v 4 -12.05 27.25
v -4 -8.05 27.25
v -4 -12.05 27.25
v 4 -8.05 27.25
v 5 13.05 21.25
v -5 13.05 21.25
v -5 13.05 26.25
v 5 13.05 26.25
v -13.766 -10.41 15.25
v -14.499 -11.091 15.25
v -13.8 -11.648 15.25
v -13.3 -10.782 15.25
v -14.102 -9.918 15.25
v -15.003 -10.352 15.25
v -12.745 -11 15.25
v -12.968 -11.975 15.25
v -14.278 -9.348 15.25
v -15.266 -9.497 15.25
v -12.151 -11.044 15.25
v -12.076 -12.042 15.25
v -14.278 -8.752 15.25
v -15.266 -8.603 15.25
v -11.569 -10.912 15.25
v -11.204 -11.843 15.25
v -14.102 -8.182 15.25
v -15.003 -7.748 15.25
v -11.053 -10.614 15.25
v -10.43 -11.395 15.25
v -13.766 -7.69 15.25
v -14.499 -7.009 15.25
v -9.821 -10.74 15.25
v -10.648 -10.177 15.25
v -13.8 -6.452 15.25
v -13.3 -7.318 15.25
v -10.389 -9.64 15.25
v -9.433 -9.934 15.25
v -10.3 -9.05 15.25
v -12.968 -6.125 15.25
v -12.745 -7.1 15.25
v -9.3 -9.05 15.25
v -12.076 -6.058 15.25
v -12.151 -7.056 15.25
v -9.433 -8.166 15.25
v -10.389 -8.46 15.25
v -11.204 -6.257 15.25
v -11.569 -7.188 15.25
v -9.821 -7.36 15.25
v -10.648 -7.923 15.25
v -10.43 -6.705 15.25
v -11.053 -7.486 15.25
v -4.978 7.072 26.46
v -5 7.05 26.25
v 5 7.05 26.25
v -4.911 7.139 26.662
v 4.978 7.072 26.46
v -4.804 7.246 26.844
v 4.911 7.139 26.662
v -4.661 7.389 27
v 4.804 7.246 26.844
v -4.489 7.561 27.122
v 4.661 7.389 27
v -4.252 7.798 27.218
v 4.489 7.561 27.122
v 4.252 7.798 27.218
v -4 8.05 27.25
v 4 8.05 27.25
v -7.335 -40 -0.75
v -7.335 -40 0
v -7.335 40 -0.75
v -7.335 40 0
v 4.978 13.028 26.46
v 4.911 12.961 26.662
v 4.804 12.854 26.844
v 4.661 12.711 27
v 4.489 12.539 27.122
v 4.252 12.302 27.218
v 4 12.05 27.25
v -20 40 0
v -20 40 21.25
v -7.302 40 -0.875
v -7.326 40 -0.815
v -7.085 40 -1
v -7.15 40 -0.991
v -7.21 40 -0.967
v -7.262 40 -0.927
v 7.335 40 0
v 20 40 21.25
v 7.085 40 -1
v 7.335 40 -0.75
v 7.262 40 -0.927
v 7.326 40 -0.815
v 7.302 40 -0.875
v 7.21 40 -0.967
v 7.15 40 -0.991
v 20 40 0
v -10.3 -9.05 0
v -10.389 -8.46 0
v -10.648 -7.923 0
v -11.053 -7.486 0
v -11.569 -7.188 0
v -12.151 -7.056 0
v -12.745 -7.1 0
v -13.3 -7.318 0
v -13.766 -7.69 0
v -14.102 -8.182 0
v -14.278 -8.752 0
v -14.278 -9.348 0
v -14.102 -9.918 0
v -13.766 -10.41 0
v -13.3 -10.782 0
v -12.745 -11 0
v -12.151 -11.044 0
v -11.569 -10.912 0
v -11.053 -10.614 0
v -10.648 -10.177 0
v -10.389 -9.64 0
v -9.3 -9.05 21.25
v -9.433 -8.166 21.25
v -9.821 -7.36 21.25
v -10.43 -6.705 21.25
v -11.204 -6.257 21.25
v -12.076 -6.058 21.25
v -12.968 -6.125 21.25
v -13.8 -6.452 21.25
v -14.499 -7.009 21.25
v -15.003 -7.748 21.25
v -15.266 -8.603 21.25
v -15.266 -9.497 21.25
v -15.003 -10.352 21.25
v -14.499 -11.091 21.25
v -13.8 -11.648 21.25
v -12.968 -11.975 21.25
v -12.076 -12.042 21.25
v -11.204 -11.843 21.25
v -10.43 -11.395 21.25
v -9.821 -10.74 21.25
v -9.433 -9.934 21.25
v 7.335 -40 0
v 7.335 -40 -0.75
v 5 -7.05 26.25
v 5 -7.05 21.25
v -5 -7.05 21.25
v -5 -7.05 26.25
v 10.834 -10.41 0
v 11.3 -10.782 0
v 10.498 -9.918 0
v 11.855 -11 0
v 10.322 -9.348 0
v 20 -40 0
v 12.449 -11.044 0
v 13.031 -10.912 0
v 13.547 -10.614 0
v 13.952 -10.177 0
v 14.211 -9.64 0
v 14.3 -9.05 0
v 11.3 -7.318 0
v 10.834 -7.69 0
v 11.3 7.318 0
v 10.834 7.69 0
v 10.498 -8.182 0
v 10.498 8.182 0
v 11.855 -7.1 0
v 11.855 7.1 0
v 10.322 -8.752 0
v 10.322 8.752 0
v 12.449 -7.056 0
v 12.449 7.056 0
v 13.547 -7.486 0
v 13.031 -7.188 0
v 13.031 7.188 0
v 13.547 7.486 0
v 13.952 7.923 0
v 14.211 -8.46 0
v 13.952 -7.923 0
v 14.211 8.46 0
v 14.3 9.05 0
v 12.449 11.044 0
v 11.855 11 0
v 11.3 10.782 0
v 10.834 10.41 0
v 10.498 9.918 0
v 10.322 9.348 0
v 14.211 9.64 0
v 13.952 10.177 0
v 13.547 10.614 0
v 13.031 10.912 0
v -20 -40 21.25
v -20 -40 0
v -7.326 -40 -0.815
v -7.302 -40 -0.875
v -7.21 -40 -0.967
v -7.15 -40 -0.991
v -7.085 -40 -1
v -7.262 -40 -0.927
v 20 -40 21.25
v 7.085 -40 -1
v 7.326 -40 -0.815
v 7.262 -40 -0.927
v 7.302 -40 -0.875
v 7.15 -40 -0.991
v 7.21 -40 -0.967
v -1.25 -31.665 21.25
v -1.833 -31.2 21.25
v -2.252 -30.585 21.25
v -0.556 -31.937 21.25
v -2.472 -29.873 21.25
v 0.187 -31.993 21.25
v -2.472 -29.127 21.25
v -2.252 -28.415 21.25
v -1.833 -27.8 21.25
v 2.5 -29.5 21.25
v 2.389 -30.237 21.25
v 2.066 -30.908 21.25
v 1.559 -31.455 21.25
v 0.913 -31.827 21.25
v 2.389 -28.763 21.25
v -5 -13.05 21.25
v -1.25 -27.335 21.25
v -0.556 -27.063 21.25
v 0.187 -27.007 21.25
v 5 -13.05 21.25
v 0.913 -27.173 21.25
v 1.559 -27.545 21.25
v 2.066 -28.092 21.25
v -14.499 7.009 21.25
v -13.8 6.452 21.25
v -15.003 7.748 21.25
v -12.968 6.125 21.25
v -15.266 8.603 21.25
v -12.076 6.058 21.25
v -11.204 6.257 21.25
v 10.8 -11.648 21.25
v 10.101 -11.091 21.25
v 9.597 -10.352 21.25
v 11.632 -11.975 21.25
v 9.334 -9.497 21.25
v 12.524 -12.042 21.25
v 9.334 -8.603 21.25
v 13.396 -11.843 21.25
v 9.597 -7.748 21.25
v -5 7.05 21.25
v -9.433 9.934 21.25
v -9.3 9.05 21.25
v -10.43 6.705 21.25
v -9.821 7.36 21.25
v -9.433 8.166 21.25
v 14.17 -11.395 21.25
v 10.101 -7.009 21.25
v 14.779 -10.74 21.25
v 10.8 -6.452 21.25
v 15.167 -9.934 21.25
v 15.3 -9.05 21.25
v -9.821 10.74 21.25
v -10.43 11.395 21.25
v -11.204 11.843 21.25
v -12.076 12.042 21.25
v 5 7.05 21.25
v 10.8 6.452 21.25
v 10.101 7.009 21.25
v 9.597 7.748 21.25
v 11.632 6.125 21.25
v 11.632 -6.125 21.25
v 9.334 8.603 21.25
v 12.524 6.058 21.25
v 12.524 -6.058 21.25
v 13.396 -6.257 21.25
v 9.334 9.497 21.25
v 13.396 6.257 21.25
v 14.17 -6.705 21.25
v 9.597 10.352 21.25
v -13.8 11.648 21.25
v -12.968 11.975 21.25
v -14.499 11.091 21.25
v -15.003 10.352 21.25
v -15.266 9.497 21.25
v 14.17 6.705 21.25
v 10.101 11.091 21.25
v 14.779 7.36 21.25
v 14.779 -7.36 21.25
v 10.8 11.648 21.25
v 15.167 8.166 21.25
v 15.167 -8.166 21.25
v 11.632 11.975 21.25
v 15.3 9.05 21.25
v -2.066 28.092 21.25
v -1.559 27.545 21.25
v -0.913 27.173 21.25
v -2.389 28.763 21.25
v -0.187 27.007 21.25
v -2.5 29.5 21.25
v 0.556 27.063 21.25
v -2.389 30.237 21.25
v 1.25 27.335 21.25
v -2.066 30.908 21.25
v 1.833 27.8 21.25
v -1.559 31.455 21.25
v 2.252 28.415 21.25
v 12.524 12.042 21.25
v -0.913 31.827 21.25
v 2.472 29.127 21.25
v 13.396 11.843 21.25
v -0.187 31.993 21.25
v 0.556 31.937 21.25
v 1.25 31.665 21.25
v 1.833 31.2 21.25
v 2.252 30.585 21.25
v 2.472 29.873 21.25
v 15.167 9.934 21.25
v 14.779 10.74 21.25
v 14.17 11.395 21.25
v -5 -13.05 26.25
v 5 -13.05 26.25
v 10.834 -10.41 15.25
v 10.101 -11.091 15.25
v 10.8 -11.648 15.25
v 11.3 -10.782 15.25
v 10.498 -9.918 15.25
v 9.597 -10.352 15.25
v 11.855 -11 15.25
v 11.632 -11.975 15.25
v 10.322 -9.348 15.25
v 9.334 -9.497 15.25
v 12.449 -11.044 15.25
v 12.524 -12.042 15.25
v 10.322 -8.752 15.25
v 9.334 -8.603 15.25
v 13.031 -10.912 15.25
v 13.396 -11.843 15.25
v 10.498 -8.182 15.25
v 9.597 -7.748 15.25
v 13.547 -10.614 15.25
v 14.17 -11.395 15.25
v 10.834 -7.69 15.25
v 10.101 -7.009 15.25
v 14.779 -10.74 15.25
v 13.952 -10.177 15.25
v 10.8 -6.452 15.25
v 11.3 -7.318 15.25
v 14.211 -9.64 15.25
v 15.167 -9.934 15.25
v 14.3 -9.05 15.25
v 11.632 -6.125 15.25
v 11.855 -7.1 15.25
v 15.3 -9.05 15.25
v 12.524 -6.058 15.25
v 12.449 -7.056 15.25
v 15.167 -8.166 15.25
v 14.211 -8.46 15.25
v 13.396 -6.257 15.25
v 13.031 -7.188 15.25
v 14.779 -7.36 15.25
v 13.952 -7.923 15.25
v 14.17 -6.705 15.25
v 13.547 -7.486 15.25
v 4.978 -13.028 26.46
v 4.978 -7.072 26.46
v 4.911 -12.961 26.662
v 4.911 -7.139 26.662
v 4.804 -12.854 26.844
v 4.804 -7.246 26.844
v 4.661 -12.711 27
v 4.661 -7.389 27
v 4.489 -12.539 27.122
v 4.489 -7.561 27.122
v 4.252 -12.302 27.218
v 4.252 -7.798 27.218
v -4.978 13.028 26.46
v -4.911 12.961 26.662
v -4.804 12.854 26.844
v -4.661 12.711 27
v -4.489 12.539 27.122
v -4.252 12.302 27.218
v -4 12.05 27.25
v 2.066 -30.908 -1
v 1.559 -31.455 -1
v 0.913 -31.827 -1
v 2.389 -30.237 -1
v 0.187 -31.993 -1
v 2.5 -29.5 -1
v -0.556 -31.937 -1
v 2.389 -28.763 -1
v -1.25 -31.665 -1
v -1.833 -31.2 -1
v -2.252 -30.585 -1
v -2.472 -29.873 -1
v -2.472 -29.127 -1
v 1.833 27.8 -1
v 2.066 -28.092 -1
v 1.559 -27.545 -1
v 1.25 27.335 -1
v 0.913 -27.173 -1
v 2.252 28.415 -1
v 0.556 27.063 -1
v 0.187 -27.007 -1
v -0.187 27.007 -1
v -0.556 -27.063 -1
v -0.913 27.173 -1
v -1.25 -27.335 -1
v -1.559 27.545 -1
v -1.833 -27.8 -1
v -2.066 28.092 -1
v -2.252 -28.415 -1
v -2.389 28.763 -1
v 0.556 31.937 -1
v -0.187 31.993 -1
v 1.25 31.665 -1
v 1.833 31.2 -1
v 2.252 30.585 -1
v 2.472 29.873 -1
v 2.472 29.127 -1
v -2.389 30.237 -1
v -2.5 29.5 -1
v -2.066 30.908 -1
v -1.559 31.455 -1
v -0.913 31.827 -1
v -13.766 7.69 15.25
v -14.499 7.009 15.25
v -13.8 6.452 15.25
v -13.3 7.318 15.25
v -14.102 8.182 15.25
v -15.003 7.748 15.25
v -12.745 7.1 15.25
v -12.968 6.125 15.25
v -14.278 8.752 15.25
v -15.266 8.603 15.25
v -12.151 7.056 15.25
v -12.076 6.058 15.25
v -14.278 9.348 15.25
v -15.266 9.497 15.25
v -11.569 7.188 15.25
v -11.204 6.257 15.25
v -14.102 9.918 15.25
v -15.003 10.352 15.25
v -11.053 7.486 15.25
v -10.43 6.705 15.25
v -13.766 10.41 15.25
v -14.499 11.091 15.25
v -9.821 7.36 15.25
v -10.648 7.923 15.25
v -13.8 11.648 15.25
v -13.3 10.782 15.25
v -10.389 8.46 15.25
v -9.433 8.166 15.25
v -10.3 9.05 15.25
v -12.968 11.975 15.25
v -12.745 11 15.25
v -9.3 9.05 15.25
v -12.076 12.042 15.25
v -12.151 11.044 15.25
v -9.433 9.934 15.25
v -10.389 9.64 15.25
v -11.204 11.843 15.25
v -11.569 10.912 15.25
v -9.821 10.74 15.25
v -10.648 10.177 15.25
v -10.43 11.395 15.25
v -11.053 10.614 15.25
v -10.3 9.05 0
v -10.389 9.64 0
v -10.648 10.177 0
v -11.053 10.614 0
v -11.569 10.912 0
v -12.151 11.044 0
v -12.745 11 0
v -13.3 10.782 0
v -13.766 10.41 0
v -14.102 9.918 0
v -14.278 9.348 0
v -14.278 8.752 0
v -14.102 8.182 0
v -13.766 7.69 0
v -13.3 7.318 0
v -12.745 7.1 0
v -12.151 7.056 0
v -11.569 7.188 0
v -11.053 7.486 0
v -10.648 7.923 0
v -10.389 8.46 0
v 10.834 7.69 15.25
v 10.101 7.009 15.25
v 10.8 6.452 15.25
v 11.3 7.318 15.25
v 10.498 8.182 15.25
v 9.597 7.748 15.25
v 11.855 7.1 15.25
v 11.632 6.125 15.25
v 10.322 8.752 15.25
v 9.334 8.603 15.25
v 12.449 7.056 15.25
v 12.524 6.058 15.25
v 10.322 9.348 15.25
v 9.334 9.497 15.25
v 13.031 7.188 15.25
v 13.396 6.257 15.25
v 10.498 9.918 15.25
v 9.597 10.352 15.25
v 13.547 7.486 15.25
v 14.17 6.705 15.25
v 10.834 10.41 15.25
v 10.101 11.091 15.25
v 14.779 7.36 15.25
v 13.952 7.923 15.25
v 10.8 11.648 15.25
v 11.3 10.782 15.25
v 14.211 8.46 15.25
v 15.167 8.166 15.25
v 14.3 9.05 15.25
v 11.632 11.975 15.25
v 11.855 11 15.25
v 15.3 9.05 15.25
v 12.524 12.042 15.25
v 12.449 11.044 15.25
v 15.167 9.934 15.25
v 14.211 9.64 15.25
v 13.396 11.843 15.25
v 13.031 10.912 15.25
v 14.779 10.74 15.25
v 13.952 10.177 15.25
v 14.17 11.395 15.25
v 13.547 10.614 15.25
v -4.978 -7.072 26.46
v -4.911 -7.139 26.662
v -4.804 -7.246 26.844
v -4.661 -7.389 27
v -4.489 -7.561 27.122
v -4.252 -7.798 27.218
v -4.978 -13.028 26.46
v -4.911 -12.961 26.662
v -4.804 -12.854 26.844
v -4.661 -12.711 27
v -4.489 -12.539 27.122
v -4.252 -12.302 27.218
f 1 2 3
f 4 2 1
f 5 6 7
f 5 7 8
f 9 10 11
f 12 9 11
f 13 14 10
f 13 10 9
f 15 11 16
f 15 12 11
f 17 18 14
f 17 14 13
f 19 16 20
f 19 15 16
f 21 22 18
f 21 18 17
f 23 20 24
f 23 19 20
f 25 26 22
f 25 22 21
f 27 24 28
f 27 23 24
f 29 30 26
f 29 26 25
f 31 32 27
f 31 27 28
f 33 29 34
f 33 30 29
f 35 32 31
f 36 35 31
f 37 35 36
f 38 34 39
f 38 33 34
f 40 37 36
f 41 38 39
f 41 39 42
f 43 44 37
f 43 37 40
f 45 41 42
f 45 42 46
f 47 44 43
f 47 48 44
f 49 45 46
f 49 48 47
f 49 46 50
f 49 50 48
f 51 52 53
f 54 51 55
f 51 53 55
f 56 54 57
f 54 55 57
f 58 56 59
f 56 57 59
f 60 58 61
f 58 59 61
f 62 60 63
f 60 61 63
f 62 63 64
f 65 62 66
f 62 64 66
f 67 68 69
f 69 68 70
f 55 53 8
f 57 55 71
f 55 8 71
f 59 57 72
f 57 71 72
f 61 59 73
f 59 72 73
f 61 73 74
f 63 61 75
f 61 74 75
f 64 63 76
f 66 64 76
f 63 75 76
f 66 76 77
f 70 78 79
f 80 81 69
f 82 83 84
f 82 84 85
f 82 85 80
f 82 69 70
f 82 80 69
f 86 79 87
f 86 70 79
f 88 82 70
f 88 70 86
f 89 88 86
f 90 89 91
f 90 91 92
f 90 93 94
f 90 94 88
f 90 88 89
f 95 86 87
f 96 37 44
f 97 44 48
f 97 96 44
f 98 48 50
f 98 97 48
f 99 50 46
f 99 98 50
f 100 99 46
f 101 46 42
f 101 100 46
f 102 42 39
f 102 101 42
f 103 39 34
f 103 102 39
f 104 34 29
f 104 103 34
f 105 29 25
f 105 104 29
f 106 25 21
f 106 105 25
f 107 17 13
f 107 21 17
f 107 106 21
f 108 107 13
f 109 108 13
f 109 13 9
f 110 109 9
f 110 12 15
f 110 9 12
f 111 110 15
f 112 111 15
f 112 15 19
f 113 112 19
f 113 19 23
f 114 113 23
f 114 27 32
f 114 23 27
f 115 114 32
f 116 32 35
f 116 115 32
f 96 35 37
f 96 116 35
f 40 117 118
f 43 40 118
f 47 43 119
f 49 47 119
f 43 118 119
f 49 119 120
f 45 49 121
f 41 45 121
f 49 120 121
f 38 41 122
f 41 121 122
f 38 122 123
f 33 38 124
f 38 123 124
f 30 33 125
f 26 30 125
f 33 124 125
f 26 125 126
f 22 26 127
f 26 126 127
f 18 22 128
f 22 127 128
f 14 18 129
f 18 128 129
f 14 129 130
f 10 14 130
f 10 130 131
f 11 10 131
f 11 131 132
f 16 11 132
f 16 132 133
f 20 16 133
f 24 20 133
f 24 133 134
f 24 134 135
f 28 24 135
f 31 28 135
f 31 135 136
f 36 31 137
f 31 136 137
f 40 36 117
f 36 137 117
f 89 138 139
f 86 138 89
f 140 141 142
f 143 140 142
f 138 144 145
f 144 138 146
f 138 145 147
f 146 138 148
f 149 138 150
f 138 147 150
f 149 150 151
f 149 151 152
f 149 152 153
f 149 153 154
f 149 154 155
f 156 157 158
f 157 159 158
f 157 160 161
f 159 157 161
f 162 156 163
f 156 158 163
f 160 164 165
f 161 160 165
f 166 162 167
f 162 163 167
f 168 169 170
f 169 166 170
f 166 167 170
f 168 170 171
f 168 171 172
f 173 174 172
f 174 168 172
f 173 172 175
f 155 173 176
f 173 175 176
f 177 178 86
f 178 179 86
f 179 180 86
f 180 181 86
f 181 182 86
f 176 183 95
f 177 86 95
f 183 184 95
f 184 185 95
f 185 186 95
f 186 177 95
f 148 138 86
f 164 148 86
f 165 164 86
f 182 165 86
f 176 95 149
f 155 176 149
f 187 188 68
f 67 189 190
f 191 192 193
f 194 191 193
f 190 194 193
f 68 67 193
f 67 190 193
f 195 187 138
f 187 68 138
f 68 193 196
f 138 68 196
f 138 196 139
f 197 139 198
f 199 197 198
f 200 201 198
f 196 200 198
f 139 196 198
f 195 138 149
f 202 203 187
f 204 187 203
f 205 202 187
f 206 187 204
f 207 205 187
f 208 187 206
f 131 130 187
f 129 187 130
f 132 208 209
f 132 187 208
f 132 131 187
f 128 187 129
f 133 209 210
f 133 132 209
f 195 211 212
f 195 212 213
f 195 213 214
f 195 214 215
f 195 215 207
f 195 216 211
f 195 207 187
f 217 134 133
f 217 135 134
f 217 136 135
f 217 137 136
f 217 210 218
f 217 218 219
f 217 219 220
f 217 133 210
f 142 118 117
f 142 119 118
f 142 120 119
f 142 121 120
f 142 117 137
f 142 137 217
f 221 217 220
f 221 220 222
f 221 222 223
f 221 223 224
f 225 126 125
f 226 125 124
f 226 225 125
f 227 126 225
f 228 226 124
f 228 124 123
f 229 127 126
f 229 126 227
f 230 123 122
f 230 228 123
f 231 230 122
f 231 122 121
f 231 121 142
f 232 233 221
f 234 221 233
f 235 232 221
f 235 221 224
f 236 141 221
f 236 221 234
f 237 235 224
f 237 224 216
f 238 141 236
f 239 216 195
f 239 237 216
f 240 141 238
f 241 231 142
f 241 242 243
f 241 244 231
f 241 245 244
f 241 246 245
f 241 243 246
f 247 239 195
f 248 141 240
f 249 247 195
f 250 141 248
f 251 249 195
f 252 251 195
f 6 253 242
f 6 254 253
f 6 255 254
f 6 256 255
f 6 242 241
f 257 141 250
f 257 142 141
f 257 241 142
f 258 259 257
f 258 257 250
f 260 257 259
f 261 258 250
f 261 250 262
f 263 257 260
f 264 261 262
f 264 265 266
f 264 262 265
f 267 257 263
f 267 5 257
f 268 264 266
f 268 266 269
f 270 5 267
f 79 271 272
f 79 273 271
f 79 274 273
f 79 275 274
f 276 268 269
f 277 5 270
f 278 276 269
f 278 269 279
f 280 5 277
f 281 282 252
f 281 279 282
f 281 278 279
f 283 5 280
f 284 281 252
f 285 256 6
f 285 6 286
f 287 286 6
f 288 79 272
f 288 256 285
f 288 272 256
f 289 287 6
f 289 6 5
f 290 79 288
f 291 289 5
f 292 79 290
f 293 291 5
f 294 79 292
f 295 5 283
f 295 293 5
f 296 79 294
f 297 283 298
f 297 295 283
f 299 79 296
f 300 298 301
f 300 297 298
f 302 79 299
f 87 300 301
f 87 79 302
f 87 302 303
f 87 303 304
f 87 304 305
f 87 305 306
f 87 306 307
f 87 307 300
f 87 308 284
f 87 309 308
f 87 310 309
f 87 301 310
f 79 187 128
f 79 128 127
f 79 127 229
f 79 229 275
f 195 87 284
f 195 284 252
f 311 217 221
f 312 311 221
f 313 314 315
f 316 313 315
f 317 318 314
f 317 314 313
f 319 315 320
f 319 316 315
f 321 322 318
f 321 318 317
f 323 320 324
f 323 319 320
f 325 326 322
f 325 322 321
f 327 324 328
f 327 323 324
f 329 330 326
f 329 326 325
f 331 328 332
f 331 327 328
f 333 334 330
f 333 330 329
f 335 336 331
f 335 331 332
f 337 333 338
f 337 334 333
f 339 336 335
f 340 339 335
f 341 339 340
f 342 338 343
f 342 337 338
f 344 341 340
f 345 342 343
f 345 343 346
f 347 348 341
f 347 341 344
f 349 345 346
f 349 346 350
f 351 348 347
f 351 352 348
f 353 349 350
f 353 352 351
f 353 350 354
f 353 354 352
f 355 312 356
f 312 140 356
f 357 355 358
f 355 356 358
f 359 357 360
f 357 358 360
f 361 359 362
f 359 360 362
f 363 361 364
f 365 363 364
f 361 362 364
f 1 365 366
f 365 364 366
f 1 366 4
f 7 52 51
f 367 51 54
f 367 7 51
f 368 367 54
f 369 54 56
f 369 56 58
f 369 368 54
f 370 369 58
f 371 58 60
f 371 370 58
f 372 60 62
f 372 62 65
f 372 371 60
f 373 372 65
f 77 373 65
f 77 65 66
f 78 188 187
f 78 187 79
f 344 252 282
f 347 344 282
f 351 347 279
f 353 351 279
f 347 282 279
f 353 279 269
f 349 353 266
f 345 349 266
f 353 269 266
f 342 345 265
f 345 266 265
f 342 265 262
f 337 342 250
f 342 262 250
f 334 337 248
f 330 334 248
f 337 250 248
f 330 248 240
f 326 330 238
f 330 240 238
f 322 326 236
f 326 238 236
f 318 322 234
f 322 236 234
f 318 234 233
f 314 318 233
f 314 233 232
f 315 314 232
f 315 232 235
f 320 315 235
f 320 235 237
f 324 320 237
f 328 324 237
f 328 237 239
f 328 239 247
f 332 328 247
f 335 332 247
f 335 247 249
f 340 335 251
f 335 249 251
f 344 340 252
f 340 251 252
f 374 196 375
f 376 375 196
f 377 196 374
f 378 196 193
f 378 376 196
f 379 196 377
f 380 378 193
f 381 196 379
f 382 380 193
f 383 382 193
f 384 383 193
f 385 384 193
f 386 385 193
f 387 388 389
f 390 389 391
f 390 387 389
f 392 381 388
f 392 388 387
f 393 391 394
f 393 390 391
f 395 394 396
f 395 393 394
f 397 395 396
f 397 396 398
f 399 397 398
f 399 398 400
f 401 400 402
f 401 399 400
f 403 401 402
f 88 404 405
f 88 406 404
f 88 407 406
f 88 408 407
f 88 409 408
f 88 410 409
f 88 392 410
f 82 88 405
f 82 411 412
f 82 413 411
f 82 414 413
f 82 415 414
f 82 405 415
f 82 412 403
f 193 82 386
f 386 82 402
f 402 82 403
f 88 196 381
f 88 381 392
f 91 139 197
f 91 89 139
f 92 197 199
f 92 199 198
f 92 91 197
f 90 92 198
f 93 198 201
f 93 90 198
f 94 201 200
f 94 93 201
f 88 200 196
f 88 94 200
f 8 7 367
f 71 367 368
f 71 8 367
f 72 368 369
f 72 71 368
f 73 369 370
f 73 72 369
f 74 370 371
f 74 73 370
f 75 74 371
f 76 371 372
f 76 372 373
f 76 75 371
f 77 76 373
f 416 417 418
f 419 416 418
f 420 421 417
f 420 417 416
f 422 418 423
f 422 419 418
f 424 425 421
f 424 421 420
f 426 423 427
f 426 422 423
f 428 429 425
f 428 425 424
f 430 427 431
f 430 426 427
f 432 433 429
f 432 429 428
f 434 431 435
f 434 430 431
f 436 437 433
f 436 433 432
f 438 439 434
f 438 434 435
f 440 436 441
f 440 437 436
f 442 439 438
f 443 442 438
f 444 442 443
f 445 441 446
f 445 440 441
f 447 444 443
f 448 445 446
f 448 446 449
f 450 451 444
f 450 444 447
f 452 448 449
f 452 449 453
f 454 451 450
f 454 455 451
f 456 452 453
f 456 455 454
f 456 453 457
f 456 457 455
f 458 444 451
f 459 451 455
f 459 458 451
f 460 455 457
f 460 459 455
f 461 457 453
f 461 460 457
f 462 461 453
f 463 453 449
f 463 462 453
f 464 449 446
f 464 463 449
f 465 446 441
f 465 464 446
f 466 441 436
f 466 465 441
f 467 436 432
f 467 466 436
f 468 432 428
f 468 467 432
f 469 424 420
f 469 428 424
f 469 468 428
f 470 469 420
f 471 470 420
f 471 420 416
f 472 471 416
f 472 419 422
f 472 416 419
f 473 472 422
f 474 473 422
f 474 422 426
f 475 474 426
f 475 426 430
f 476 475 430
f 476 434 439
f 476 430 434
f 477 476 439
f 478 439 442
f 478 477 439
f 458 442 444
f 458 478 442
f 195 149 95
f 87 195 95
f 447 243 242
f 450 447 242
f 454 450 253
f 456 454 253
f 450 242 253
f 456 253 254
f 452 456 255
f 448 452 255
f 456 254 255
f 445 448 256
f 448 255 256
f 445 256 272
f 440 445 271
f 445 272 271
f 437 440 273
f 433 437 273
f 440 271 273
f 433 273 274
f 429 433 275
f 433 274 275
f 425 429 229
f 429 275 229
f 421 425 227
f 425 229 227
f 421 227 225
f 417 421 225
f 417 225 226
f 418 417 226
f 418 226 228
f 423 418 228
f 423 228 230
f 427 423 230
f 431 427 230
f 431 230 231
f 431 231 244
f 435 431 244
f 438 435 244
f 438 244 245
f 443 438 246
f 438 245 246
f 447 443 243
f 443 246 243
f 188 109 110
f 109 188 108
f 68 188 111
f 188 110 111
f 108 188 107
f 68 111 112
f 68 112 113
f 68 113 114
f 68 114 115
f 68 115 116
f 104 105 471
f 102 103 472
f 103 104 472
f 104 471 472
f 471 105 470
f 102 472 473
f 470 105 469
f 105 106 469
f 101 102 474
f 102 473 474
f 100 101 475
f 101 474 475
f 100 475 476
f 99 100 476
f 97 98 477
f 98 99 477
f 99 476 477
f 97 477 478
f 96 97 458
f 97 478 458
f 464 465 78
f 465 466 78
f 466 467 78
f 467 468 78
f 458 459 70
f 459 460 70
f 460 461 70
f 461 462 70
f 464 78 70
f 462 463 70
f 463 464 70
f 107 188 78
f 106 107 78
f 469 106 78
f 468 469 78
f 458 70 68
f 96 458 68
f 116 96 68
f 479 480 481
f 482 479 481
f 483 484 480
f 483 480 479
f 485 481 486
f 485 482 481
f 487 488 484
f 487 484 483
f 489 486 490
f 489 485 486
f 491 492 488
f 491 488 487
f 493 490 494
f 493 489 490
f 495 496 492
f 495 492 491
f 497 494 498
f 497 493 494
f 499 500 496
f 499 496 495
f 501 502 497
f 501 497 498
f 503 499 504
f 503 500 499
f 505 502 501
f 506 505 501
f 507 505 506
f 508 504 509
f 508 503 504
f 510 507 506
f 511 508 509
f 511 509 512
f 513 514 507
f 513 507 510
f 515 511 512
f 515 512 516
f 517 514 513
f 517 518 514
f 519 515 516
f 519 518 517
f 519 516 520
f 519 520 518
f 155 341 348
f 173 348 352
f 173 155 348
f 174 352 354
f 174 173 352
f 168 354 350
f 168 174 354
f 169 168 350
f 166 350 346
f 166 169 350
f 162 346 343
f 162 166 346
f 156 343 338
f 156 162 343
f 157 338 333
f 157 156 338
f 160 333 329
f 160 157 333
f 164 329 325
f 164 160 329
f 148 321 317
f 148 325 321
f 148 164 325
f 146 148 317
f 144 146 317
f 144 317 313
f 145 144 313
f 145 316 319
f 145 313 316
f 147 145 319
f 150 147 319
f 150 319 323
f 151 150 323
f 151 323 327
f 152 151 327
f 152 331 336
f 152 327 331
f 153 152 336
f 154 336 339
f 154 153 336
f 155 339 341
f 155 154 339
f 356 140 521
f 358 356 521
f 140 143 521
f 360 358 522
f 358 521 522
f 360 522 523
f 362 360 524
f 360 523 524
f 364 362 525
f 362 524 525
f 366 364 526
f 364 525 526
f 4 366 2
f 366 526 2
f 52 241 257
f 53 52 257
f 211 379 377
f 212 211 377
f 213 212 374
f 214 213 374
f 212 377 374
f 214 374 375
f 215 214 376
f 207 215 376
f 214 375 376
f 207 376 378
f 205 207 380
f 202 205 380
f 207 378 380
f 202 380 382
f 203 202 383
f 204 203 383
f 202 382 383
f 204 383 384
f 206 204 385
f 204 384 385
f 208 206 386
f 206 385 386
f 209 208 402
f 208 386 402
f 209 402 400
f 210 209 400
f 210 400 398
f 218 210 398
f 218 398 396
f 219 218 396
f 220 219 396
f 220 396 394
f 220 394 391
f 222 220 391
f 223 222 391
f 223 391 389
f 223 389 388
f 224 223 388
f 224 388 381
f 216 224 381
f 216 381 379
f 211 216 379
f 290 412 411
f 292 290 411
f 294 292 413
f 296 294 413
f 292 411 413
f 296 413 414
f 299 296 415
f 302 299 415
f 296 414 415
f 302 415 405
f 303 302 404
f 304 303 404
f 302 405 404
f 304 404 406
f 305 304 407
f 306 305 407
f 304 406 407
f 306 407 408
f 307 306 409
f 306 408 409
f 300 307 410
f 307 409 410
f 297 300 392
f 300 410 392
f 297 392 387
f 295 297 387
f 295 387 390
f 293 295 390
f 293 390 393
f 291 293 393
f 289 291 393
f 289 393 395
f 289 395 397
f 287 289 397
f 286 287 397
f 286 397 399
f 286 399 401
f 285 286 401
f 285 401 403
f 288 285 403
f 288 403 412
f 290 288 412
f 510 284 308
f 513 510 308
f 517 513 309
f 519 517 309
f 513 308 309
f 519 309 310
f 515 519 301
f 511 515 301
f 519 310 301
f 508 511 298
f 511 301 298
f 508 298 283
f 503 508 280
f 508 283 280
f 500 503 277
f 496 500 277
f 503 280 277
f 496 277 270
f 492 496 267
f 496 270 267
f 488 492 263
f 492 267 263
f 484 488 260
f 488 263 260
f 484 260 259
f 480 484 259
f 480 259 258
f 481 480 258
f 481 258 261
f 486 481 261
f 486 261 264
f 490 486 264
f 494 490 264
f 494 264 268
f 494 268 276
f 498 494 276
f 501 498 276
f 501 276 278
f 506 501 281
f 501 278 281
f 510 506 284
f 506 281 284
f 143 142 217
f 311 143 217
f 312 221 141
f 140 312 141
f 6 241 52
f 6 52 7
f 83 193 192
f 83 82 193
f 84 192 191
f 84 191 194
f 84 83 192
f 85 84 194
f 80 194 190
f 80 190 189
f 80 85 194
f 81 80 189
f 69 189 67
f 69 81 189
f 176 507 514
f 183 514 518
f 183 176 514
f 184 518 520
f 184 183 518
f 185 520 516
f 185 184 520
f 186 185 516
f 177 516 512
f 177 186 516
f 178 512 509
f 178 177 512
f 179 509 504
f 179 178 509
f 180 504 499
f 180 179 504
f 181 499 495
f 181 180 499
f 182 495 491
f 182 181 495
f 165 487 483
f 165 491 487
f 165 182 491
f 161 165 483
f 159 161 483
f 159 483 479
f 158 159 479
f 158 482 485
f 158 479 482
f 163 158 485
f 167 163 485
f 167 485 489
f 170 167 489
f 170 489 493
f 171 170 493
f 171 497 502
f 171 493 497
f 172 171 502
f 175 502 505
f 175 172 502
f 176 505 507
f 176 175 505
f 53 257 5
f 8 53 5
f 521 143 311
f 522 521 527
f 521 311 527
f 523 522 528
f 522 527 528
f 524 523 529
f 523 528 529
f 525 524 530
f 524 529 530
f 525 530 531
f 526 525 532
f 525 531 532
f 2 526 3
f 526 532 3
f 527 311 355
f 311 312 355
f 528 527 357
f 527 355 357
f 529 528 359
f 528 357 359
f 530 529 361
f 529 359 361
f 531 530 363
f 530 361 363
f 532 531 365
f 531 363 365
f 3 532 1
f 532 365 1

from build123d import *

# Parameters (mm, degrees)
SKETCH1_W           = 40
SKETCH1_H           = 80
SKETCH1_R           = 2
BOSS_EXTRUDE1_DEPTH = 21.25
SKETCH4_W           = 14.67
SKETCH4_H           = 80
BOSS_EXTRUDE3_DEPTH = 1
FILLET1_R           = 0.25
FILLET2_R           = 0.25
SKETCH2_W           = 10
SKETCH2_H           = 6
BOSS_EXTRUDE4_DEPTH = 6
SKETCH5_R           = 2.5
CUT_EXTRUDE1_DEPTH  = 53.896715399
SKETCH6_R           = 3
CUT_EXTRUDE2_DEPTH  = 6
FILLET3_R           = 1


with BuildPart() as part:
    # Sketch1 → Boss-Extrude1 (new body)
    with BuildSketch(Plane.XY):
        Rectangle(SKETCH1_W, SKETCH1_H)
        with Locations((12.3, 9.05)):
            Circle(SKETCH1_R, mode=Mode.SUBTRACT)
        with Locations((12.3, -9.05)):
            Circle(SKETCH1_R, mode=Mode.SUBTRACT)
        with Locations((-12.3, 9.05)):
            Circle(SKETCH1_R, mode=Mode.SUBTRACT)
        with Locations((-12.3, -9.05)):
            Circle(SKETCH1_R, mode=Mode.SUBTRACT)
    extrude(amount=BOSS_EXTRUDE1_DEPTH)

    # Sketch4 → Boss-Extrude3 (add)
    with BuildSketch(Plane(origin=(0, 0, 0), x_dir=(-1, 0, 0), z_dir=(0, 0, -1))):
        Rectangle(SKETCH4_W, SKETCH4_H)
    extrude(amount=BOSS_EXTRUDE3_DEPTH)

    # Fillet1
    fillet1_edges = [part.edges().sort_by_distance(p)[0] for p in [
        (7.335, 0, -1),
    ]]
    fillet(fillet1_edges, radius=FILLET1_R)

    # Fillet2
    fillet2_edges = [part.edges().sort_by_distance(p)[0] for p in [
        (-7.335, 0, -1),
    ]]
    fillet(fillet2_edges, radius=FILLET2_R)

    # Sketch2 → Boss-Extrude4 (add)
    with BuildSketch(Plane.XY.offset(21.25)):
        Polygon((-5, -13.05), (0, -13.05), (5, -13.05), (5, -7.05), (-5, -7.05), align=None)
        with Locations((0, 10.05)):
            Rectangle(SKETCH2_W, SKETCH2_H)
    extrude(amount=BOSS_EXTRUDE4_DEPTH)

    # Sketch5 → Cut-Extrude1 (cut, through all)
    with BuildSketch(Plane(origin=(0, 0, -1), x_dir=(-1, 0, 0), z_dir=(0, 0, -1))):
        with Locations((0, 29.5)):
            Circle(SKETCH5_R)
        with Locations(Location((0, -29.5, 0), (0, 0, 180))):
            Circle(SKETCH5_R)
    extrude(amount=-CUT_EXTRUDE1_DEPTH, mode=Mode.SUBTRACT)

    # Sketch6 → Cut-Extrude2 (cut)
    with BuildSketch(Plane.XY.offset(21.25)):
        with Locations((-12.3, 9.05)):
            Circle(SKETCH6_R)
        with Locations((12.3, 9.05)):
            Circle(SKETCH6_R)
        with Locations((12.3, -9.05)):
            Circle(SKETCH6_R)
        with Locations((-12.3, -9.05)):
            Circle(SKETCH6_R)
    extrude(amount=-CUT_EXTRUDE2_DEPTH, mode=Mode.SUBTRACT)

    # Fillet3
    fillet3_edges = [part.edges().sort_by_distance(p)[0] for p in [
        (5, -10.05, 27.25),
        (0, -7.05, 27.25),
        (-5, -10.05, 27.25),
        (0, -13.05, 27.25),
        (0, 13.05, 27.25),
        (-5, 10.05, 27.25),
        (0, 7.05, 27.25),
        (5, 10.05, 27.25),
    ]]
    fillet(fillet3_edges, radius=FILLET3_R)


solid = part.part
